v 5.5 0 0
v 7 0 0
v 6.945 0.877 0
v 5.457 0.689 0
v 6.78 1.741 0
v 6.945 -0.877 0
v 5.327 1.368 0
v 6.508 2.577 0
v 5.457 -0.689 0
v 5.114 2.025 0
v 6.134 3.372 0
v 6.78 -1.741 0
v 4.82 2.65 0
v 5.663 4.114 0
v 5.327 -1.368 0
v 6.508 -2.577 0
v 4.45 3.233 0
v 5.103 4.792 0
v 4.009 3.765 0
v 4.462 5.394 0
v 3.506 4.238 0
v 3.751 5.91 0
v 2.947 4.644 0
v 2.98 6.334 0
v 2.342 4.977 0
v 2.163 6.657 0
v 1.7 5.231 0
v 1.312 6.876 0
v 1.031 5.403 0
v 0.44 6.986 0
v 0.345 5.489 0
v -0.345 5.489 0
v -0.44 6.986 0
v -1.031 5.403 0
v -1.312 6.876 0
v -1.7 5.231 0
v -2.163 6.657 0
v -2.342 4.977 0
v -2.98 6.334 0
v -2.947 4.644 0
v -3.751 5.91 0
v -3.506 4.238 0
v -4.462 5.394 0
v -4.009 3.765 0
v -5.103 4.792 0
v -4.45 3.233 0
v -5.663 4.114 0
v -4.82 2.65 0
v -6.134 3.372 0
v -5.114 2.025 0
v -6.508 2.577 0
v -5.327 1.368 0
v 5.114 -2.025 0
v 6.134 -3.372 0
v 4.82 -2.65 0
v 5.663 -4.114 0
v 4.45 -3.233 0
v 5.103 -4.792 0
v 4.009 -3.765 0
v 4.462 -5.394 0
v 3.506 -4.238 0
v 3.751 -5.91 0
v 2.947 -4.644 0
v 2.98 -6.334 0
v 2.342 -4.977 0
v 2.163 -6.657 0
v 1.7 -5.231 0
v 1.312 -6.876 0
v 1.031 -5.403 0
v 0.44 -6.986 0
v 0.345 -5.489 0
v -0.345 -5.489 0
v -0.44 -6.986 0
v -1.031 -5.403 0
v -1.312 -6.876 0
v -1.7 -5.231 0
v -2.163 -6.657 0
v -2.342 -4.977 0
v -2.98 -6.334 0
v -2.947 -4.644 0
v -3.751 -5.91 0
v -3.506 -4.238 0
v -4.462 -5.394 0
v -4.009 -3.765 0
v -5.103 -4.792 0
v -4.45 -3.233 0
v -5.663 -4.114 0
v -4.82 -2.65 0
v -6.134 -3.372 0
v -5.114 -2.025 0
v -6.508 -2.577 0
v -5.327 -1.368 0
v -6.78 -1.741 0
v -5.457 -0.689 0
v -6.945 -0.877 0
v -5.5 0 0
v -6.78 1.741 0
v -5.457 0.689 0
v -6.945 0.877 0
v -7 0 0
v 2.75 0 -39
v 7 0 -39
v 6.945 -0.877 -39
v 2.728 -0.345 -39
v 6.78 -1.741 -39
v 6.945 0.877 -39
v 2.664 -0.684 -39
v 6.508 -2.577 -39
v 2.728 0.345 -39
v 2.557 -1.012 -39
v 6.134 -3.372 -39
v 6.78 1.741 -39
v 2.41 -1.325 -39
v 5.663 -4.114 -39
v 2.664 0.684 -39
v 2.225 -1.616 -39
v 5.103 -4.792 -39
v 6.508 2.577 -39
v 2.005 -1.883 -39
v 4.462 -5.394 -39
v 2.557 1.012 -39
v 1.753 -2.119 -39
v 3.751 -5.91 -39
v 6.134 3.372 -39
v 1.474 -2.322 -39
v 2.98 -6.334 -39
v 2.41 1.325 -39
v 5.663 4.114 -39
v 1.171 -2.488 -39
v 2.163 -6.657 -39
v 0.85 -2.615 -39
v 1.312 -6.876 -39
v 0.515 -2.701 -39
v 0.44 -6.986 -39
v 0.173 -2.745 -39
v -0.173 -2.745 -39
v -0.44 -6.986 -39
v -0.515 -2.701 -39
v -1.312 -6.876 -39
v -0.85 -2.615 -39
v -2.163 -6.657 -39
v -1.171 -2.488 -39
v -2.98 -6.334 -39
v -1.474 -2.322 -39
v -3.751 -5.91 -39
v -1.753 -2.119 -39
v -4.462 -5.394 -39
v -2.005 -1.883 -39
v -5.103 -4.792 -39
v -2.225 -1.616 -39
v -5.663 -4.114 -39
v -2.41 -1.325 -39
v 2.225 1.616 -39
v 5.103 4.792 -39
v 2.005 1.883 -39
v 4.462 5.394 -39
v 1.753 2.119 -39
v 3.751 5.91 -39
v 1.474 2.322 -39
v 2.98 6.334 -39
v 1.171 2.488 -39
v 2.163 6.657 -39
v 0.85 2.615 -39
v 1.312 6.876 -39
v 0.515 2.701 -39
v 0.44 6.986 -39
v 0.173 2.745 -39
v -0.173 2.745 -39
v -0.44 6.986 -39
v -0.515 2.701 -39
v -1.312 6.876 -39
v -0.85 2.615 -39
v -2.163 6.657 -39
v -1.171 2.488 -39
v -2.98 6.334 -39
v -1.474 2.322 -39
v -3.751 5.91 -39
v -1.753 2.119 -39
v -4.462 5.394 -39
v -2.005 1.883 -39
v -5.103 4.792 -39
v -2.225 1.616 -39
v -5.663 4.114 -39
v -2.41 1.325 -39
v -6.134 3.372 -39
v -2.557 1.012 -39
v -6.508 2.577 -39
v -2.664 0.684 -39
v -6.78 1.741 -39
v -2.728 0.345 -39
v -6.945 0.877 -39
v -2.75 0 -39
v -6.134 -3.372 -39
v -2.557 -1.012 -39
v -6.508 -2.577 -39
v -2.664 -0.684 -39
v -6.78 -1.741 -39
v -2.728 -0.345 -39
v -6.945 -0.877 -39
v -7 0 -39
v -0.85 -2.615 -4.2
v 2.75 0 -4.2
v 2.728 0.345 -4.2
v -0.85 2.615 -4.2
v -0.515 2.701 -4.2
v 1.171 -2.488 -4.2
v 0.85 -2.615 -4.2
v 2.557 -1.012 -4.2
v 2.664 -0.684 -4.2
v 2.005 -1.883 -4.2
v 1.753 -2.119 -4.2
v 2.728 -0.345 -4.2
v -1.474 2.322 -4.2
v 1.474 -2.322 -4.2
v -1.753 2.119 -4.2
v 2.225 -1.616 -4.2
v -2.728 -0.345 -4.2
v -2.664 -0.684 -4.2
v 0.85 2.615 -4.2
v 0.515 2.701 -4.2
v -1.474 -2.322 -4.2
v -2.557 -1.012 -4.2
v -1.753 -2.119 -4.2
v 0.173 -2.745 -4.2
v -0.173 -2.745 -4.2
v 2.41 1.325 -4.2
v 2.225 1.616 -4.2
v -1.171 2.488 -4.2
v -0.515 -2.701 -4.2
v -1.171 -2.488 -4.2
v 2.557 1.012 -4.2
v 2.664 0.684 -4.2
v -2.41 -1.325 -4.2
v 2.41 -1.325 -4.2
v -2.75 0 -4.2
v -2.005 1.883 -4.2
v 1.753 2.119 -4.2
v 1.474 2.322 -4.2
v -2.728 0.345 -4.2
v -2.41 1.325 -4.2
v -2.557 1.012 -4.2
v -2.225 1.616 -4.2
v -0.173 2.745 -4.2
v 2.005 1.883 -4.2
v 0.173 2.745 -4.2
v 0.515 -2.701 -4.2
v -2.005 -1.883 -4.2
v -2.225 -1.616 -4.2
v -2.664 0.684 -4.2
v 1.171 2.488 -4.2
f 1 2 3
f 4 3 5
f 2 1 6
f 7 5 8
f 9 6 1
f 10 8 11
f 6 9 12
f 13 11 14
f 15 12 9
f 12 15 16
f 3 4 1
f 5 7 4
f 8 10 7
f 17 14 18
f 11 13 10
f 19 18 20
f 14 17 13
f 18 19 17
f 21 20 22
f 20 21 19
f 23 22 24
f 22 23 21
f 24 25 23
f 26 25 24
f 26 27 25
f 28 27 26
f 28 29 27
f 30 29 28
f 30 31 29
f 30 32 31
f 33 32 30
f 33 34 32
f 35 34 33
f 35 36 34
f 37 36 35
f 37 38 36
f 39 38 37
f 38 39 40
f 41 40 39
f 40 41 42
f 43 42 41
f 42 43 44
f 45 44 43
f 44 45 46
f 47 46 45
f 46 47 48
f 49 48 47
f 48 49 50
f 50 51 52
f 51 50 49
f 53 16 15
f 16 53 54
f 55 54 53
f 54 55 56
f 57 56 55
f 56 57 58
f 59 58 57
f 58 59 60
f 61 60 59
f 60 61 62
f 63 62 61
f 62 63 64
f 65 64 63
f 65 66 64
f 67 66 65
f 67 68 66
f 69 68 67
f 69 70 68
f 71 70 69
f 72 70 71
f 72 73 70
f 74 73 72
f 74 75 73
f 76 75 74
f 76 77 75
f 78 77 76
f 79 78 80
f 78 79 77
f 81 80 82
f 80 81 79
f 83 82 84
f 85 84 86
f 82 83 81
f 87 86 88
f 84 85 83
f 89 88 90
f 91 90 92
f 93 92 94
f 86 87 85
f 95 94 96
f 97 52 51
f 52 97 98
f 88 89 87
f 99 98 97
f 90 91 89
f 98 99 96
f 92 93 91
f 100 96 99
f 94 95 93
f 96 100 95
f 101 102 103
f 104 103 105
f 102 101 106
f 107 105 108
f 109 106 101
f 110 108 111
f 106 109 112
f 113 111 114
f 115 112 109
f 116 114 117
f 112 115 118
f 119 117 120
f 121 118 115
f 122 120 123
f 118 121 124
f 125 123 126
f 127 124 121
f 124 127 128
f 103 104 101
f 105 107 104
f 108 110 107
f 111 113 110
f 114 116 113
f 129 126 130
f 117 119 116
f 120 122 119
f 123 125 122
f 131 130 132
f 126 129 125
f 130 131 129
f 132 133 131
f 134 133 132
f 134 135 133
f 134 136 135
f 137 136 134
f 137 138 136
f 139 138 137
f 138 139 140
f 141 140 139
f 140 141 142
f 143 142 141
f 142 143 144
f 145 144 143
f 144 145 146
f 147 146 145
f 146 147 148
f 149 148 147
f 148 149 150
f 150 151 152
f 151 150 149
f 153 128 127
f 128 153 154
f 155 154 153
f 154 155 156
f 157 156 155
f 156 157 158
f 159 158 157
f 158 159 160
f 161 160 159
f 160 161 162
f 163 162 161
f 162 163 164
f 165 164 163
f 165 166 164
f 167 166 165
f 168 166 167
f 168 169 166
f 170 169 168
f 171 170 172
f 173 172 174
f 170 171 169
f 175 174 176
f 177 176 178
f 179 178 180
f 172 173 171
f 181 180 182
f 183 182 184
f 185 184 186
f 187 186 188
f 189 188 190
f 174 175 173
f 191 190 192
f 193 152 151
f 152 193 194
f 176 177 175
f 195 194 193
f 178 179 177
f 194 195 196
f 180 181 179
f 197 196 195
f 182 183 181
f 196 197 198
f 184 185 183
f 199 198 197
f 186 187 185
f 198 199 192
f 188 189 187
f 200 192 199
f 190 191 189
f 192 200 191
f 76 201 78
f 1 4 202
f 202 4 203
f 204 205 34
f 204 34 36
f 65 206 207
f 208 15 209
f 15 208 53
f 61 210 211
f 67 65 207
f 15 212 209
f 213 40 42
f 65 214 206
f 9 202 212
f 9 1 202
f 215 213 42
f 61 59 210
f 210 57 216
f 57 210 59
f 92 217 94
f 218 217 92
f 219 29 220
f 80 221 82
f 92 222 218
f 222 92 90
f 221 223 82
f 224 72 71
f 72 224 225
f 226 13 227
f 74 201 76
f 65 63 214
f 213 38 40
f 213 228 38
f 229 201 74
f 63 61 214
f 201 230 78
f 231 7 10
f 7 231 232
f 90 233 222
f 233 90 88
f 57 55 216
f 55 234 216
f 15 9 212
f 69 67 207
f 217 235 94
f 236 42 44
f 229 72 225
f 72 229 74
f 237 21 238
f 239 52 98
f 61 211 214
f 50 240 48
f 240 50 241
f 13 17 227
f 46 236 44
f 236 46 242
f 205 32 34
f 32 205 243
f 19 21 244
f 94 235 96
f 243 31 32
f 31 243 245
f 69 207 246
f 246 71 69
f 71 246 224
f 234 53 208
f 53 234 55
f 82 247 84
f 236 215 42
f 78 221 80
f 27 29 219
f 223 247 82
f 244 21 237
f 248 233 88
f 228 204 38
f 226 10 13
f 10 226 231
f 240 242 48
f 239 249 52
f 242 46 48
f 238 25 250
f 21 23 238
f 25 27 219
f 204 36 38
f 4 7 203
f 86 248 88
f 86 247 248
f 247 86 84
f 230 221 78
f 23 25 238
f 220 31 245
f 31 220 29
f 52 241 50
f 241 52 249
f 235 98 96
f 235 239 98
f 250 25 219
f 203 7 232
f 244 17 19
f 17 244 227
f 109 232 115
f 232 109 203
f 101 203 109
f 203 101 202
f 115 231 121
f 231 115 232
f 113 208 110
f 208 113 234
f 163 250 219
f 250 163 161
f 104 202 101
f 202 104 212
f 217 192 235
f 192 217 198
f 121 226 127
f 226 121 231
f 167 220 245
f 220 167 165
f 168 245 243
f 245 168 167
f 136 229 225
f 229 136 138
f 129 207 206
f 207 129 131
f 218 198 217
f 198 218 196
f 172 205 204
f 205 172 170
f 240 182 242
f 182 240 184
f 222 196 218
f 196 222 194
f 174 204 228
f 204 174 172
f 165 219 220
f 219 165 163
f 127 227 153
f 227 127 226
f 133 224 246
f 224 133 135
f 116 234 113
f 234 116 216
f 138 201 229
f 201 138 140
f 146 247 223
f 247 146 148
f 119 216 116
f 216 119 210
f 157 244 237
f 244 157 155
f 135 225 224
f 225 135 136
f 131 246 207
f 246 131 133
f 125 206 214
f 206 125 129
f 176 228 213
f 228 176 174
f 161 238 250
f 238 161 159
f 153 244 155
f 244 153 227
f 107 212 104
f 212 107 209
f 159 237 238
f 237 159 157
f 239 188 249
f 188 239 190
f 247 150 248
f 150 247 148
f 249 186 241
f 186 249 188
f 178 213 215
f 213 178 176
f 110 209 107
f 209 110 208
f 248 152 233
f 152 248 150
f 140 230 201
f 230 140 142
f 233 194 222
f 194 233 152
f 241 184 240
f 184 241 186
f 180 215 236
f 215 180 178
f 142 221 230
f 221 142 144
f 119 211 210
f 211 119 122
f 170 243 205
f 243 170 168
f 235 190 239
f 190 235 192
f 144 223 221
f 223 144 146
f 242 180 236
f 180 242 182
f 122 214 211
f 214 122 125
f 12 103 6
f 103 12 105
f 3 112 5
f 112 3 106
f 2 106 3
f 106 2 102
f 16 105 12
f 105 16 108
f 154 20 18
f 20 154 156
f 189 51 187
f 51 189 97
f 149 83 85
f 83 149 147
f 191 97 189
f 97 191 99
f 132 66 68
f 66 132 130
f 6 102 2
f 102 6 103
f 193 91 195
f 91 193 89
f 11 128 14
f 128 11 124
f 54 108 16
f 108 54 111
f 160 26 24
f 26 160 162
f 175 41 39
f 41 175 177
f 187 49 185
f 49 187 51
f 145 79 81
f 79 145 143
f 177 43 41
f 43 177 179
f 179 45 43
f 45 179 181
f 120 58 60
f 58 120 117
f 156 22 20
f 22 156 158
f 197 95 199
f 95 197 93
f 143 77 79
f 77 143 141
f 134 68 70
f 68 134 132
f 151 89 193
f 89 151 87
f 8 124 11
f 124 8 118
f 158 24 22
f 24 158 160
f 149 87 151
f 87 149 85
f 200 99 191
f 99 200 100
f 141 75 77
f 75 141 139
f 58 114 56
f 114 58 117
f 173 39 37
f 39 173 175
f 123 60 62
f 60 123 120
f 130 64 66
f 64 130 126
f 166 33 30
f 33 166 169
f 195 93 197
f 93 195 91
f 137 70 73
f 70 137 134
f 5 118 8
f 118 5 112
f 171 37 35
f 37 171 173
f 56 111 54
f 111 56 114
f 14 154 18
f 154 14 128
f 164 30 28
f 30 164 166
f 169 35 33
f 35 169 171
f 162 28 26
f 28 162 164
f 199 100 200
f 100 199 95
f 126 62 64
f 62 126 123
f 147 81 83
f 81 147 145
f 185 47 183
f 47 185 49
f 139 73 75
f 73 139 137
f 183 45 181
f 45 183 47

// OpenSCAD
$fn = 50;


difference() {
	union() {
		translate(v = [0, 0, -39.0000000000]) {
			cylinder(h = 39, r = 7.0000000000);
		}
		cylinder(h = 0, r = 10.0000000000);
	}
	union() {
		translate(v = [0, 0, 0]) {
			rotate(a = [0, 0, 0]) {
				difference() {
					union() {
						#translate(v = [0, 0, -39.0000000000]) {
							cylinder(h = 39, r = 2.2500000000);
						}
						#translate(v = [0, 0, -4.2000000000]) {
							cylinder(h = 4.2000000000, r1 = 2.7500000000, r2 = 5.5000000000);
						}
						#translate(v = [0, 0, -39.0000000000]) {
							cylinder(h = 39, r = 2.7500000000);
						}
						#translate(v = [0, 0, -39.0000000000]) {
							cylinder(h = 39, r = 2.2500000000);
						}
					}
					union();
				}
			}
		}
	}
}
